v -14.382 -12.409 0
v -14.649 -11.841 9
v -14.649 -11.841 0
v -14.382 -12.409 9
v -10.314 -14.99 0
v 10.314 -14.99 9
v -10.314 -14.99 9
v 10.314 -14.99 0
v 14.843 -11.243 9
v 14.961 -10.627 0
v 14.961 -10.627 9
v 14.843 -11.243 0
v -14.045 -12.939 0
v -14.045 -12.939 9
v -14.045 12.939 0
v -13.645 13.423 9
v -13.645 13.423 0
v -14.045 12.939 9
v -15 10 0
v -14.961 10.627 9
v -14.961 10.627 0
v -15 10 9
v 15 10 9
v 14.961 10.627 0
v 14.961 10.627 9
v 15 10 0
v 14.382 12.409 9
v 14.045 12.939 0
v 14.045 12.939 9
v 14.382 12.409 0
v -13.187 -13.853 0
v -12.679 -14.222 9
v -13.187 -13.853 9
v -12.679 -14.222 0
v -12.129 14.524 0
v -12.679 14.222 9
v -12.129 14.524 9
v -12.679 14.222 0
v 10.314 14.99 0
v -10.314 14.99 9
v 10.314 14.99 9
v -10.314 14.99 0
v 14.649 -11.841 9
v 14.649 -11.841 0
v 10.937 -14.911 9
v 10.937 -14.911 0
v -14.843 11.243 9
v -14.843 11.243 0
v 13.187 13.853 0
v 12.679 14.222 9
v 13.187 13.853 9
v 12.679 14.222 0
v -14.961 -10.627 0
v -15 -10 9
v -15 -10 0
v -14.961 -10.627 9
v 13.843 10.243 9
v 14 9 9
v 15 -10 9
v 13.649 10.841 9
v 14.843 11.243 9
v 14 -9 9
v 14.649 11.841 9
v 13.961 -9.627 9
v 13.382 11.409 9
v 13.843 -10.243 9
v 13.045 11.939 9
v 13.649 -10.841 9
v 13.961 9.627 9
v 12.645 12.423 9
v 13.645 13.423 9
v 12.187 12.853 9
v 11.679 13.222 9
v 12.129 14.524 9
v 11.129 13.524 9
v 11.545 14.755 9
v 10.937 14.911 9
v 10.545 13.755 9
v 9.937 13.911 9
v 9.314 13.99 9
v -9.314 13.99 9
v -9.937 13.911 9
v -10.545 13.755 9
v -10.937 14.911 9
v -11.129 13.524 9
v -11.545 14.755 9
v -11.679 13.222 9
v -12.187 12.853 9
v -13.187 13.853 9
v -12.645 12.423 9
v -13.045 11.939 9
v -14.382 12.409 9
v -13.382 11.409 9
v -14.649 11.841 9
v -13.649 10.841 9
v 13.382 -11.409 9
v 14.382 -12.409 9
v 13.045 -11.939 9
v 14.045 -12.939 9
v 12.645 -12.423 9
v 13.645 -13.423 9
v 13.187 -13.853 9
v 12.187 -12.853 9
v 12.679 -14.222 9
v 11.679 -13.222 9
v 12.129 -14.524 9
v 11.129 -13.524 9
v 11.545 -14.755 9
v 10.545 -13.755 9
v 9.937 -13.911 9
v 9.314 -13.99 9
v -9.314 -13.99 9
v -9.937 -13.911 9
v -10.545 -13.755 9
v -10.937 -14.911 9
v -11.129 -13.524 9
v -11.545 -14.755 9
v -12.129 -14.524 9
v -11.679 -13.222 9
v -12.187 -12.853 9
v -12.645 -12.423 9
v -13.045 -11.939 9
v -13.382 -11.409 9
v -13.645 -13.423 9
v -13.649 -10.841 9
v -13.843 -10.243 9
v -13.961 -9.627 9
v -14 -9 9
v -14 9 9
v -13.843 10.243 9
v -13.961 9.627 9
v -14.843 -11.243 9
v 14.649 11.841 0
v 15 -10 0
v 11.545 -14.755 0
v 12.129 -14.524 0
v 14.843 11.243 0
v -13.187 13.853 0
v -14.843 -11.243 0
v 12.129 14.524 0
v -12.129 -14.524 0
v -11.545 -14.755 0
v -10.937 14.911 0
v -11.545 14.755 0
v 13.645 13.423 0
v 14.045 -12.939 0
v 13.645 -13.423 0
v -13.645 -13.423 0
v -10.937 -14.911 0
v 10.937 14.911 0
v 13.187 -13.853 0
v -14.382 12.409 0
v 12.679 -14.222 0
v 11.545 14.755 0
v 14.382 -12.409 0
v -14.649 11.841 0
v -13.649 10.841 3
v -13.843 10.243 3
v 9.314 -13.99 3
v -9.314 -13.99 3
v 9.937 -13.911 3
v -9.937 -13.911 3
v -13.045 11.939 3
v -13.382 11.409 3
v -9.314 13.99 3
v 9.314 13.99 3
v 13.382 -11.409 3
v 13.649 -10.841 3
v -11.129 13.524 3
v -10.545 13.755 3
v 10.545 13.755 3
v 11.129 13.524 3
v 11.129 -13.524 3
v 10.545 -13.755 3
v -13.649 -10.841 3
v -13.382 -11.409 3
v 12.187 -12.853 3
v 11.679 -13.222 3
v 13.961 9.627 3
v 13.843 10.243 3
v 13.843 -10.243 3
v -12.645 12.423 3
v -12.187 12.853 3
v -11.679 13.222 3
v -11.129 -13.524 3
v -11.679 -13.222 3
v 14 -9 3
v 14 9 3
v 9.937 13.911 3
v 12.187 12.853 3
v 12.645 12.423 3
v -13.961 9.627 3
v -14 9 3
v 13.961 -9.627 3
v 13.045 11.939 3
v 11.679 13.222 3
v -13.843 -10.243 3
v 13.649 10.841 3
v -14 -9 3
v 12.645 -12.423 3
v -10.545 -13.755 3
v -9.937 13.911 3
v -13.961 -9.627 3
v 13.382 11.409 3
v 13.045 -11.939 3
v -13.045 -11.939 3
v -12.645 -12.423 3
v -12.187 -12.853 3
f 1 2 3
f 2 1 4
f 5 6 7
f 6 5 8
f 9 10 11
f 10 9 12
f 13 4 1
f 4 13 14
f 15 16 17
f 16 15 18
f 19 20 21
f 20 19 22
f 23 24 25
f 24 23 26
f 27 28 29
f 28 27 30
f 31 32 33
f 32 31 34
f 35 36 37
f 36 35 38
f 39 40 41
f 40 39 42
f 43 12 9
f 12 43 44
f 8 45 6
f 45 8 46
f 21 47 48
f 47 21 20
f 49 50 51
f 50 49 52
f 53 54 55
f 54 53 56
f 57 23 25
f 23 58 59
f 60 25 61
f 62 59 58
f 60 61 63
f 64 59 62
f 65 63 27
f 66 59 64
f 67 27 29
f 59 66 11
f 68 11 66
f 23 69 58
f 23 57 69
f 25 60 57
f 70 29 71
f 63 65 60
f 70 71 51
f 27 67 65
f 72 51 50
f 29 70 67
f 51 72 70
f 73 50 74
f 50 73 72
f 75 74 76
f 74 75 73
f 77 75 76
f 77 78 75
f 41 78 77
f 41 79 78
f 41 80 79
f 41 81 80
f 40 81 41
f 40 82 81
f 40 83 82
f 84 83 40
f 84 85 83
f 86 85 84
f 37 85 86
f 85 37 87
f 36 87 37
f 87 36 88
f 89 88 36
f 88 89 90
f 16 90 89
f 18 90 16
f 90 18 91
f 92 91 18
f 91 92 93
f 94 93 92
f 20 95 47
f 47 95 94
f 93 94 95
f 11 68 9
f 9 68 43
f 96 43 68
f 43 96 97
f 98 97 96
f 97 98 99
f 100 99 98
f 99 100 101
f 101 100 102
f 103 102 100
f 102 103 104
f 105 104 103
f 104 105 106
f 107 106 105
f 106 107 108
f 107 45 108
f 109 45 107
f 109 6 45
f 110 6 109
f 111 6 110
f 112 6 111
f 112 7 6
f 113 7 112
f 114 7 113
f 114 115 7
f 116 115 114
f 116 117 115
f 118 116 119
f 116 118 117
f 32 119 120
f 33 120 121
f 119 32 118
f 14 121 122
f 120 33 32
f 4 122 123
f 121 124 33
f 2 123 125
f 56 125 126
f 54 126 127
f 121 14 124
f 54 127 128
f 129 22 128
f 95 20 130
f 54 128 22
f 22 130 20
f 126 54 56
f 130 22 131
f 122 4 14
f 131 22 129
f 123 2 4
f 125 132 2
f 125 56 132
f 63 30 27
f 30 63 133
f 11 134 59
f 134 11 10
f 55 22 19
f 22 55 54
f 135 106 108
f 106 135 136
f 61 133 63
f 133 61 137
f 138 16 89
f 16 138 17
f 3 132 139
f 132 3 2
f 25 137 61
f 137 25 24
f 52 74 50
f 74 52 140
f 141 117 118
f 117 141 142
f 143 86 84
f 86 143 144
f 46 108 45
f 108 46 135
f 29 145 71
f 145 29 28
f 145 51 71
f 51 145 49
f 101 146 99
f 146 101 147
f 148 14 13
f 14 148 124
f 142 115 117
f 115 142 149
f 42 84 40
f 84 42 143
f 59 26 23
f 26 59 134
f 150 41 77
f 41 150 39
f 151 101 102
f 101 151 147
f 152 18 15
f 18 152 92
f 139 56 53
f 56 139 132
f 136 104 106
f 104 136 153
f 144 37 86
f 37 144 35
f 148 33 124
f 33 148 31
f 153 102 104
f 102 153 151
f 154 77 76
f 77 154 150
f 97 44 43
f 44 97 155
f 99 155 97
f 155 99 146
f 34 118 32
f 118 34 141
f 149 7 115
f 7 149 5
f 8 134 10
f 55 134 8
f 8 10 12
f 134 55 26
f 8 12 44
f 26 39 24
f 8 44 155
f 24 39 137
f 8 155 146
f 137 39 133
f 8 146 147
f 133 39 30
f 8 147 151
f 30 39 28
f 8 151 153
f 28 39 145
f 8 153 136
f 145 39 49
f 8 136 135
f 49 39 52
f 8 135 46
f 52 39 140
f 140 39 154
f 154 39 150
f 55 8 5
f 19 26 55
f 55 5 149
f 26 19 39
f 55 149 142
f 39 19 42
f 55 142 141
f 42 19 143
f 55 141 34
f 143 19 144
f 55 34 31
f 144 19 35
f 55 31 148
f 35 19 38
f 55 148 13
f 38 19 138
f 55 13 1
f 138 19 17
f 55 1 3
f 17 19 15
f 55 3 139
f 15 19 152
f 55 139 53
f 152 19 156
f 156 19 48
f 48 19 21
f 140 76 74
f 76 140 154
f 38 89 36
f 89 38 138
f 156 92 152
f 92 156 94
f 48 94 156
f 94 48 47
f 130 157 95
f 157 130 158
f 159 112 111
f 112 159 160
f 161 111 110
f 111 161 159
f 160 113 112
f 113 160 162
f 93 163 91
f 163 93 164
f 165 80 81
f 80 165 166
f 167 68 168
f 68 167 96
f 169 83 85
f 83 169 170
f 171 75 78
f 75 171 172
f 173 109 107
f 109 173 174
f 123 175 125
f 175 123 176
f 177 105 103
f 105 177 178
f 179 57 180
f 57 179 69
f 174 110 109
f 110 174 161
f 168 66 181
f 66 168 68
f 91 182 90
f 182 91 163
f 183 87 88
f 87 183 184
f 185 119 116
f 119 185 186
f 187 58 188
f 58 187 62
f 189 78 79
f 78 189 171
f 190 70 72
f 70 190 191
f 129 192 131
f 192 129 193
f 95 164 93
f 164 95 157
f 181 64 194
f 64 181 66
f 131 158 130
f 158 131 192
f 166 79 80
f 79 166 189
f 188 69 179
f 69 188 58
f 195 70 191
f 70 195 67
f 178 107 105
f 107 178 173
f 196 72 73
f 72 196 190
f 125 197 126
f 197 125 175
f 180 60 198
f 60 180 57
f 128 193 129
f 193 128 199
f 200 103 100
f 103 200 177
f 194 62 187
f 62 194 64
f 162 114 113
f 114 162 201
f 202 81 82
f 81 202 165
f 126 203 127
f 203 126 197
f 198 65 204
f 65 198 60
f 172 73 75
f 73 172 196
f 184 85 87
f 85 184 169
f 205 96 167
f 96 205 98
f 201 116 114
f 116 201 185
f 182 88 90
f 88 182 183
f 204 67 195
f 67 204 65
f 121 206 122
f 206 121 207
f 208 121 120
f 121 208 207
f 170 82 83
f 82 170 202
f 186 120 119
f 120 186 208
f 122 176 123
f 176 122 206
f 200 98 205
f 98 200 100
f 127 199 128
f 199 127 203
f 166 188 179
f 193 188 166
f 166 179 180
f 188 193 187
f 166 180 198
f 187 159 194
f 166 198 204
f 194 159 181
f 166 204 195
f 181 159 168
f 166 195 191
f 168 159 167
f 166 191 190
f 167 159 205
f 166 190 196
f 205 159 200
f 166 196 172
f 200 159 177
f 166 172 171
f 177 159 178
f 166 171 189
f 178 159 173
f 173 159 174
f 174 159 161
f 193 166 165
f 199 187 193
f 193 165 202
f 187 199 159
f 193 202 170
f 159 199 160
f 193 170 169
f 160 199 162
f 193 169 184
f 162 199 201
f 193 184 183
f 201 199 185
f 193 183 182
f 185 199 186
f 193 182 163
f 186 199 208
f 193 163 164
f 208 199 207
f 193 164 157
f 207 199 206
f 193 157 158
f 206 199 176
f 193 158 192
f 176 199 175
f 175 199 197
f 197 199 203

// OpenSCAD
$fn = 50;


difference() {
	union() {
		hull() {
			translate(v = [-10.0000000000, 10.0000000000, 0]) {
				cylinder(h = 9, r = 5);
			}
			translate(v = [10.0000000000, 10.0000000000, 0]) {
				cylinder(h = 9, r = 5);
			}
			translate(v = [-10.0000000000, -10.0000000000, 0]) {
				cylinder(h = 9, r = 5);
			}
			translate(v = [10.0000000000, -10.0000000000, 0]) {
				cylinder(h = 9, r = 5);
			}
		}
	}
	union() {
		translate(v = [0, 0, 3]) {
			#hull() {
				translate(v = [-9.0000000000, 9.0000000000, 0]) {
					cylinder(h = 6, r = 5);
				}
				translate(v = [9.0000000000, 9.0000000000, 0]) {
					cylinder(h = 6, r = 5);
				}
				translate(v = [-9.0000000000, -9.0000000000, 0]) {
					cylinder(h = 6, r = 5);
				}
				translate(v = [9.0000000000, -9.0000000000, 0]) {
					cylinder(h = 6, r = 5);
				}
			}
		}
	}
}
